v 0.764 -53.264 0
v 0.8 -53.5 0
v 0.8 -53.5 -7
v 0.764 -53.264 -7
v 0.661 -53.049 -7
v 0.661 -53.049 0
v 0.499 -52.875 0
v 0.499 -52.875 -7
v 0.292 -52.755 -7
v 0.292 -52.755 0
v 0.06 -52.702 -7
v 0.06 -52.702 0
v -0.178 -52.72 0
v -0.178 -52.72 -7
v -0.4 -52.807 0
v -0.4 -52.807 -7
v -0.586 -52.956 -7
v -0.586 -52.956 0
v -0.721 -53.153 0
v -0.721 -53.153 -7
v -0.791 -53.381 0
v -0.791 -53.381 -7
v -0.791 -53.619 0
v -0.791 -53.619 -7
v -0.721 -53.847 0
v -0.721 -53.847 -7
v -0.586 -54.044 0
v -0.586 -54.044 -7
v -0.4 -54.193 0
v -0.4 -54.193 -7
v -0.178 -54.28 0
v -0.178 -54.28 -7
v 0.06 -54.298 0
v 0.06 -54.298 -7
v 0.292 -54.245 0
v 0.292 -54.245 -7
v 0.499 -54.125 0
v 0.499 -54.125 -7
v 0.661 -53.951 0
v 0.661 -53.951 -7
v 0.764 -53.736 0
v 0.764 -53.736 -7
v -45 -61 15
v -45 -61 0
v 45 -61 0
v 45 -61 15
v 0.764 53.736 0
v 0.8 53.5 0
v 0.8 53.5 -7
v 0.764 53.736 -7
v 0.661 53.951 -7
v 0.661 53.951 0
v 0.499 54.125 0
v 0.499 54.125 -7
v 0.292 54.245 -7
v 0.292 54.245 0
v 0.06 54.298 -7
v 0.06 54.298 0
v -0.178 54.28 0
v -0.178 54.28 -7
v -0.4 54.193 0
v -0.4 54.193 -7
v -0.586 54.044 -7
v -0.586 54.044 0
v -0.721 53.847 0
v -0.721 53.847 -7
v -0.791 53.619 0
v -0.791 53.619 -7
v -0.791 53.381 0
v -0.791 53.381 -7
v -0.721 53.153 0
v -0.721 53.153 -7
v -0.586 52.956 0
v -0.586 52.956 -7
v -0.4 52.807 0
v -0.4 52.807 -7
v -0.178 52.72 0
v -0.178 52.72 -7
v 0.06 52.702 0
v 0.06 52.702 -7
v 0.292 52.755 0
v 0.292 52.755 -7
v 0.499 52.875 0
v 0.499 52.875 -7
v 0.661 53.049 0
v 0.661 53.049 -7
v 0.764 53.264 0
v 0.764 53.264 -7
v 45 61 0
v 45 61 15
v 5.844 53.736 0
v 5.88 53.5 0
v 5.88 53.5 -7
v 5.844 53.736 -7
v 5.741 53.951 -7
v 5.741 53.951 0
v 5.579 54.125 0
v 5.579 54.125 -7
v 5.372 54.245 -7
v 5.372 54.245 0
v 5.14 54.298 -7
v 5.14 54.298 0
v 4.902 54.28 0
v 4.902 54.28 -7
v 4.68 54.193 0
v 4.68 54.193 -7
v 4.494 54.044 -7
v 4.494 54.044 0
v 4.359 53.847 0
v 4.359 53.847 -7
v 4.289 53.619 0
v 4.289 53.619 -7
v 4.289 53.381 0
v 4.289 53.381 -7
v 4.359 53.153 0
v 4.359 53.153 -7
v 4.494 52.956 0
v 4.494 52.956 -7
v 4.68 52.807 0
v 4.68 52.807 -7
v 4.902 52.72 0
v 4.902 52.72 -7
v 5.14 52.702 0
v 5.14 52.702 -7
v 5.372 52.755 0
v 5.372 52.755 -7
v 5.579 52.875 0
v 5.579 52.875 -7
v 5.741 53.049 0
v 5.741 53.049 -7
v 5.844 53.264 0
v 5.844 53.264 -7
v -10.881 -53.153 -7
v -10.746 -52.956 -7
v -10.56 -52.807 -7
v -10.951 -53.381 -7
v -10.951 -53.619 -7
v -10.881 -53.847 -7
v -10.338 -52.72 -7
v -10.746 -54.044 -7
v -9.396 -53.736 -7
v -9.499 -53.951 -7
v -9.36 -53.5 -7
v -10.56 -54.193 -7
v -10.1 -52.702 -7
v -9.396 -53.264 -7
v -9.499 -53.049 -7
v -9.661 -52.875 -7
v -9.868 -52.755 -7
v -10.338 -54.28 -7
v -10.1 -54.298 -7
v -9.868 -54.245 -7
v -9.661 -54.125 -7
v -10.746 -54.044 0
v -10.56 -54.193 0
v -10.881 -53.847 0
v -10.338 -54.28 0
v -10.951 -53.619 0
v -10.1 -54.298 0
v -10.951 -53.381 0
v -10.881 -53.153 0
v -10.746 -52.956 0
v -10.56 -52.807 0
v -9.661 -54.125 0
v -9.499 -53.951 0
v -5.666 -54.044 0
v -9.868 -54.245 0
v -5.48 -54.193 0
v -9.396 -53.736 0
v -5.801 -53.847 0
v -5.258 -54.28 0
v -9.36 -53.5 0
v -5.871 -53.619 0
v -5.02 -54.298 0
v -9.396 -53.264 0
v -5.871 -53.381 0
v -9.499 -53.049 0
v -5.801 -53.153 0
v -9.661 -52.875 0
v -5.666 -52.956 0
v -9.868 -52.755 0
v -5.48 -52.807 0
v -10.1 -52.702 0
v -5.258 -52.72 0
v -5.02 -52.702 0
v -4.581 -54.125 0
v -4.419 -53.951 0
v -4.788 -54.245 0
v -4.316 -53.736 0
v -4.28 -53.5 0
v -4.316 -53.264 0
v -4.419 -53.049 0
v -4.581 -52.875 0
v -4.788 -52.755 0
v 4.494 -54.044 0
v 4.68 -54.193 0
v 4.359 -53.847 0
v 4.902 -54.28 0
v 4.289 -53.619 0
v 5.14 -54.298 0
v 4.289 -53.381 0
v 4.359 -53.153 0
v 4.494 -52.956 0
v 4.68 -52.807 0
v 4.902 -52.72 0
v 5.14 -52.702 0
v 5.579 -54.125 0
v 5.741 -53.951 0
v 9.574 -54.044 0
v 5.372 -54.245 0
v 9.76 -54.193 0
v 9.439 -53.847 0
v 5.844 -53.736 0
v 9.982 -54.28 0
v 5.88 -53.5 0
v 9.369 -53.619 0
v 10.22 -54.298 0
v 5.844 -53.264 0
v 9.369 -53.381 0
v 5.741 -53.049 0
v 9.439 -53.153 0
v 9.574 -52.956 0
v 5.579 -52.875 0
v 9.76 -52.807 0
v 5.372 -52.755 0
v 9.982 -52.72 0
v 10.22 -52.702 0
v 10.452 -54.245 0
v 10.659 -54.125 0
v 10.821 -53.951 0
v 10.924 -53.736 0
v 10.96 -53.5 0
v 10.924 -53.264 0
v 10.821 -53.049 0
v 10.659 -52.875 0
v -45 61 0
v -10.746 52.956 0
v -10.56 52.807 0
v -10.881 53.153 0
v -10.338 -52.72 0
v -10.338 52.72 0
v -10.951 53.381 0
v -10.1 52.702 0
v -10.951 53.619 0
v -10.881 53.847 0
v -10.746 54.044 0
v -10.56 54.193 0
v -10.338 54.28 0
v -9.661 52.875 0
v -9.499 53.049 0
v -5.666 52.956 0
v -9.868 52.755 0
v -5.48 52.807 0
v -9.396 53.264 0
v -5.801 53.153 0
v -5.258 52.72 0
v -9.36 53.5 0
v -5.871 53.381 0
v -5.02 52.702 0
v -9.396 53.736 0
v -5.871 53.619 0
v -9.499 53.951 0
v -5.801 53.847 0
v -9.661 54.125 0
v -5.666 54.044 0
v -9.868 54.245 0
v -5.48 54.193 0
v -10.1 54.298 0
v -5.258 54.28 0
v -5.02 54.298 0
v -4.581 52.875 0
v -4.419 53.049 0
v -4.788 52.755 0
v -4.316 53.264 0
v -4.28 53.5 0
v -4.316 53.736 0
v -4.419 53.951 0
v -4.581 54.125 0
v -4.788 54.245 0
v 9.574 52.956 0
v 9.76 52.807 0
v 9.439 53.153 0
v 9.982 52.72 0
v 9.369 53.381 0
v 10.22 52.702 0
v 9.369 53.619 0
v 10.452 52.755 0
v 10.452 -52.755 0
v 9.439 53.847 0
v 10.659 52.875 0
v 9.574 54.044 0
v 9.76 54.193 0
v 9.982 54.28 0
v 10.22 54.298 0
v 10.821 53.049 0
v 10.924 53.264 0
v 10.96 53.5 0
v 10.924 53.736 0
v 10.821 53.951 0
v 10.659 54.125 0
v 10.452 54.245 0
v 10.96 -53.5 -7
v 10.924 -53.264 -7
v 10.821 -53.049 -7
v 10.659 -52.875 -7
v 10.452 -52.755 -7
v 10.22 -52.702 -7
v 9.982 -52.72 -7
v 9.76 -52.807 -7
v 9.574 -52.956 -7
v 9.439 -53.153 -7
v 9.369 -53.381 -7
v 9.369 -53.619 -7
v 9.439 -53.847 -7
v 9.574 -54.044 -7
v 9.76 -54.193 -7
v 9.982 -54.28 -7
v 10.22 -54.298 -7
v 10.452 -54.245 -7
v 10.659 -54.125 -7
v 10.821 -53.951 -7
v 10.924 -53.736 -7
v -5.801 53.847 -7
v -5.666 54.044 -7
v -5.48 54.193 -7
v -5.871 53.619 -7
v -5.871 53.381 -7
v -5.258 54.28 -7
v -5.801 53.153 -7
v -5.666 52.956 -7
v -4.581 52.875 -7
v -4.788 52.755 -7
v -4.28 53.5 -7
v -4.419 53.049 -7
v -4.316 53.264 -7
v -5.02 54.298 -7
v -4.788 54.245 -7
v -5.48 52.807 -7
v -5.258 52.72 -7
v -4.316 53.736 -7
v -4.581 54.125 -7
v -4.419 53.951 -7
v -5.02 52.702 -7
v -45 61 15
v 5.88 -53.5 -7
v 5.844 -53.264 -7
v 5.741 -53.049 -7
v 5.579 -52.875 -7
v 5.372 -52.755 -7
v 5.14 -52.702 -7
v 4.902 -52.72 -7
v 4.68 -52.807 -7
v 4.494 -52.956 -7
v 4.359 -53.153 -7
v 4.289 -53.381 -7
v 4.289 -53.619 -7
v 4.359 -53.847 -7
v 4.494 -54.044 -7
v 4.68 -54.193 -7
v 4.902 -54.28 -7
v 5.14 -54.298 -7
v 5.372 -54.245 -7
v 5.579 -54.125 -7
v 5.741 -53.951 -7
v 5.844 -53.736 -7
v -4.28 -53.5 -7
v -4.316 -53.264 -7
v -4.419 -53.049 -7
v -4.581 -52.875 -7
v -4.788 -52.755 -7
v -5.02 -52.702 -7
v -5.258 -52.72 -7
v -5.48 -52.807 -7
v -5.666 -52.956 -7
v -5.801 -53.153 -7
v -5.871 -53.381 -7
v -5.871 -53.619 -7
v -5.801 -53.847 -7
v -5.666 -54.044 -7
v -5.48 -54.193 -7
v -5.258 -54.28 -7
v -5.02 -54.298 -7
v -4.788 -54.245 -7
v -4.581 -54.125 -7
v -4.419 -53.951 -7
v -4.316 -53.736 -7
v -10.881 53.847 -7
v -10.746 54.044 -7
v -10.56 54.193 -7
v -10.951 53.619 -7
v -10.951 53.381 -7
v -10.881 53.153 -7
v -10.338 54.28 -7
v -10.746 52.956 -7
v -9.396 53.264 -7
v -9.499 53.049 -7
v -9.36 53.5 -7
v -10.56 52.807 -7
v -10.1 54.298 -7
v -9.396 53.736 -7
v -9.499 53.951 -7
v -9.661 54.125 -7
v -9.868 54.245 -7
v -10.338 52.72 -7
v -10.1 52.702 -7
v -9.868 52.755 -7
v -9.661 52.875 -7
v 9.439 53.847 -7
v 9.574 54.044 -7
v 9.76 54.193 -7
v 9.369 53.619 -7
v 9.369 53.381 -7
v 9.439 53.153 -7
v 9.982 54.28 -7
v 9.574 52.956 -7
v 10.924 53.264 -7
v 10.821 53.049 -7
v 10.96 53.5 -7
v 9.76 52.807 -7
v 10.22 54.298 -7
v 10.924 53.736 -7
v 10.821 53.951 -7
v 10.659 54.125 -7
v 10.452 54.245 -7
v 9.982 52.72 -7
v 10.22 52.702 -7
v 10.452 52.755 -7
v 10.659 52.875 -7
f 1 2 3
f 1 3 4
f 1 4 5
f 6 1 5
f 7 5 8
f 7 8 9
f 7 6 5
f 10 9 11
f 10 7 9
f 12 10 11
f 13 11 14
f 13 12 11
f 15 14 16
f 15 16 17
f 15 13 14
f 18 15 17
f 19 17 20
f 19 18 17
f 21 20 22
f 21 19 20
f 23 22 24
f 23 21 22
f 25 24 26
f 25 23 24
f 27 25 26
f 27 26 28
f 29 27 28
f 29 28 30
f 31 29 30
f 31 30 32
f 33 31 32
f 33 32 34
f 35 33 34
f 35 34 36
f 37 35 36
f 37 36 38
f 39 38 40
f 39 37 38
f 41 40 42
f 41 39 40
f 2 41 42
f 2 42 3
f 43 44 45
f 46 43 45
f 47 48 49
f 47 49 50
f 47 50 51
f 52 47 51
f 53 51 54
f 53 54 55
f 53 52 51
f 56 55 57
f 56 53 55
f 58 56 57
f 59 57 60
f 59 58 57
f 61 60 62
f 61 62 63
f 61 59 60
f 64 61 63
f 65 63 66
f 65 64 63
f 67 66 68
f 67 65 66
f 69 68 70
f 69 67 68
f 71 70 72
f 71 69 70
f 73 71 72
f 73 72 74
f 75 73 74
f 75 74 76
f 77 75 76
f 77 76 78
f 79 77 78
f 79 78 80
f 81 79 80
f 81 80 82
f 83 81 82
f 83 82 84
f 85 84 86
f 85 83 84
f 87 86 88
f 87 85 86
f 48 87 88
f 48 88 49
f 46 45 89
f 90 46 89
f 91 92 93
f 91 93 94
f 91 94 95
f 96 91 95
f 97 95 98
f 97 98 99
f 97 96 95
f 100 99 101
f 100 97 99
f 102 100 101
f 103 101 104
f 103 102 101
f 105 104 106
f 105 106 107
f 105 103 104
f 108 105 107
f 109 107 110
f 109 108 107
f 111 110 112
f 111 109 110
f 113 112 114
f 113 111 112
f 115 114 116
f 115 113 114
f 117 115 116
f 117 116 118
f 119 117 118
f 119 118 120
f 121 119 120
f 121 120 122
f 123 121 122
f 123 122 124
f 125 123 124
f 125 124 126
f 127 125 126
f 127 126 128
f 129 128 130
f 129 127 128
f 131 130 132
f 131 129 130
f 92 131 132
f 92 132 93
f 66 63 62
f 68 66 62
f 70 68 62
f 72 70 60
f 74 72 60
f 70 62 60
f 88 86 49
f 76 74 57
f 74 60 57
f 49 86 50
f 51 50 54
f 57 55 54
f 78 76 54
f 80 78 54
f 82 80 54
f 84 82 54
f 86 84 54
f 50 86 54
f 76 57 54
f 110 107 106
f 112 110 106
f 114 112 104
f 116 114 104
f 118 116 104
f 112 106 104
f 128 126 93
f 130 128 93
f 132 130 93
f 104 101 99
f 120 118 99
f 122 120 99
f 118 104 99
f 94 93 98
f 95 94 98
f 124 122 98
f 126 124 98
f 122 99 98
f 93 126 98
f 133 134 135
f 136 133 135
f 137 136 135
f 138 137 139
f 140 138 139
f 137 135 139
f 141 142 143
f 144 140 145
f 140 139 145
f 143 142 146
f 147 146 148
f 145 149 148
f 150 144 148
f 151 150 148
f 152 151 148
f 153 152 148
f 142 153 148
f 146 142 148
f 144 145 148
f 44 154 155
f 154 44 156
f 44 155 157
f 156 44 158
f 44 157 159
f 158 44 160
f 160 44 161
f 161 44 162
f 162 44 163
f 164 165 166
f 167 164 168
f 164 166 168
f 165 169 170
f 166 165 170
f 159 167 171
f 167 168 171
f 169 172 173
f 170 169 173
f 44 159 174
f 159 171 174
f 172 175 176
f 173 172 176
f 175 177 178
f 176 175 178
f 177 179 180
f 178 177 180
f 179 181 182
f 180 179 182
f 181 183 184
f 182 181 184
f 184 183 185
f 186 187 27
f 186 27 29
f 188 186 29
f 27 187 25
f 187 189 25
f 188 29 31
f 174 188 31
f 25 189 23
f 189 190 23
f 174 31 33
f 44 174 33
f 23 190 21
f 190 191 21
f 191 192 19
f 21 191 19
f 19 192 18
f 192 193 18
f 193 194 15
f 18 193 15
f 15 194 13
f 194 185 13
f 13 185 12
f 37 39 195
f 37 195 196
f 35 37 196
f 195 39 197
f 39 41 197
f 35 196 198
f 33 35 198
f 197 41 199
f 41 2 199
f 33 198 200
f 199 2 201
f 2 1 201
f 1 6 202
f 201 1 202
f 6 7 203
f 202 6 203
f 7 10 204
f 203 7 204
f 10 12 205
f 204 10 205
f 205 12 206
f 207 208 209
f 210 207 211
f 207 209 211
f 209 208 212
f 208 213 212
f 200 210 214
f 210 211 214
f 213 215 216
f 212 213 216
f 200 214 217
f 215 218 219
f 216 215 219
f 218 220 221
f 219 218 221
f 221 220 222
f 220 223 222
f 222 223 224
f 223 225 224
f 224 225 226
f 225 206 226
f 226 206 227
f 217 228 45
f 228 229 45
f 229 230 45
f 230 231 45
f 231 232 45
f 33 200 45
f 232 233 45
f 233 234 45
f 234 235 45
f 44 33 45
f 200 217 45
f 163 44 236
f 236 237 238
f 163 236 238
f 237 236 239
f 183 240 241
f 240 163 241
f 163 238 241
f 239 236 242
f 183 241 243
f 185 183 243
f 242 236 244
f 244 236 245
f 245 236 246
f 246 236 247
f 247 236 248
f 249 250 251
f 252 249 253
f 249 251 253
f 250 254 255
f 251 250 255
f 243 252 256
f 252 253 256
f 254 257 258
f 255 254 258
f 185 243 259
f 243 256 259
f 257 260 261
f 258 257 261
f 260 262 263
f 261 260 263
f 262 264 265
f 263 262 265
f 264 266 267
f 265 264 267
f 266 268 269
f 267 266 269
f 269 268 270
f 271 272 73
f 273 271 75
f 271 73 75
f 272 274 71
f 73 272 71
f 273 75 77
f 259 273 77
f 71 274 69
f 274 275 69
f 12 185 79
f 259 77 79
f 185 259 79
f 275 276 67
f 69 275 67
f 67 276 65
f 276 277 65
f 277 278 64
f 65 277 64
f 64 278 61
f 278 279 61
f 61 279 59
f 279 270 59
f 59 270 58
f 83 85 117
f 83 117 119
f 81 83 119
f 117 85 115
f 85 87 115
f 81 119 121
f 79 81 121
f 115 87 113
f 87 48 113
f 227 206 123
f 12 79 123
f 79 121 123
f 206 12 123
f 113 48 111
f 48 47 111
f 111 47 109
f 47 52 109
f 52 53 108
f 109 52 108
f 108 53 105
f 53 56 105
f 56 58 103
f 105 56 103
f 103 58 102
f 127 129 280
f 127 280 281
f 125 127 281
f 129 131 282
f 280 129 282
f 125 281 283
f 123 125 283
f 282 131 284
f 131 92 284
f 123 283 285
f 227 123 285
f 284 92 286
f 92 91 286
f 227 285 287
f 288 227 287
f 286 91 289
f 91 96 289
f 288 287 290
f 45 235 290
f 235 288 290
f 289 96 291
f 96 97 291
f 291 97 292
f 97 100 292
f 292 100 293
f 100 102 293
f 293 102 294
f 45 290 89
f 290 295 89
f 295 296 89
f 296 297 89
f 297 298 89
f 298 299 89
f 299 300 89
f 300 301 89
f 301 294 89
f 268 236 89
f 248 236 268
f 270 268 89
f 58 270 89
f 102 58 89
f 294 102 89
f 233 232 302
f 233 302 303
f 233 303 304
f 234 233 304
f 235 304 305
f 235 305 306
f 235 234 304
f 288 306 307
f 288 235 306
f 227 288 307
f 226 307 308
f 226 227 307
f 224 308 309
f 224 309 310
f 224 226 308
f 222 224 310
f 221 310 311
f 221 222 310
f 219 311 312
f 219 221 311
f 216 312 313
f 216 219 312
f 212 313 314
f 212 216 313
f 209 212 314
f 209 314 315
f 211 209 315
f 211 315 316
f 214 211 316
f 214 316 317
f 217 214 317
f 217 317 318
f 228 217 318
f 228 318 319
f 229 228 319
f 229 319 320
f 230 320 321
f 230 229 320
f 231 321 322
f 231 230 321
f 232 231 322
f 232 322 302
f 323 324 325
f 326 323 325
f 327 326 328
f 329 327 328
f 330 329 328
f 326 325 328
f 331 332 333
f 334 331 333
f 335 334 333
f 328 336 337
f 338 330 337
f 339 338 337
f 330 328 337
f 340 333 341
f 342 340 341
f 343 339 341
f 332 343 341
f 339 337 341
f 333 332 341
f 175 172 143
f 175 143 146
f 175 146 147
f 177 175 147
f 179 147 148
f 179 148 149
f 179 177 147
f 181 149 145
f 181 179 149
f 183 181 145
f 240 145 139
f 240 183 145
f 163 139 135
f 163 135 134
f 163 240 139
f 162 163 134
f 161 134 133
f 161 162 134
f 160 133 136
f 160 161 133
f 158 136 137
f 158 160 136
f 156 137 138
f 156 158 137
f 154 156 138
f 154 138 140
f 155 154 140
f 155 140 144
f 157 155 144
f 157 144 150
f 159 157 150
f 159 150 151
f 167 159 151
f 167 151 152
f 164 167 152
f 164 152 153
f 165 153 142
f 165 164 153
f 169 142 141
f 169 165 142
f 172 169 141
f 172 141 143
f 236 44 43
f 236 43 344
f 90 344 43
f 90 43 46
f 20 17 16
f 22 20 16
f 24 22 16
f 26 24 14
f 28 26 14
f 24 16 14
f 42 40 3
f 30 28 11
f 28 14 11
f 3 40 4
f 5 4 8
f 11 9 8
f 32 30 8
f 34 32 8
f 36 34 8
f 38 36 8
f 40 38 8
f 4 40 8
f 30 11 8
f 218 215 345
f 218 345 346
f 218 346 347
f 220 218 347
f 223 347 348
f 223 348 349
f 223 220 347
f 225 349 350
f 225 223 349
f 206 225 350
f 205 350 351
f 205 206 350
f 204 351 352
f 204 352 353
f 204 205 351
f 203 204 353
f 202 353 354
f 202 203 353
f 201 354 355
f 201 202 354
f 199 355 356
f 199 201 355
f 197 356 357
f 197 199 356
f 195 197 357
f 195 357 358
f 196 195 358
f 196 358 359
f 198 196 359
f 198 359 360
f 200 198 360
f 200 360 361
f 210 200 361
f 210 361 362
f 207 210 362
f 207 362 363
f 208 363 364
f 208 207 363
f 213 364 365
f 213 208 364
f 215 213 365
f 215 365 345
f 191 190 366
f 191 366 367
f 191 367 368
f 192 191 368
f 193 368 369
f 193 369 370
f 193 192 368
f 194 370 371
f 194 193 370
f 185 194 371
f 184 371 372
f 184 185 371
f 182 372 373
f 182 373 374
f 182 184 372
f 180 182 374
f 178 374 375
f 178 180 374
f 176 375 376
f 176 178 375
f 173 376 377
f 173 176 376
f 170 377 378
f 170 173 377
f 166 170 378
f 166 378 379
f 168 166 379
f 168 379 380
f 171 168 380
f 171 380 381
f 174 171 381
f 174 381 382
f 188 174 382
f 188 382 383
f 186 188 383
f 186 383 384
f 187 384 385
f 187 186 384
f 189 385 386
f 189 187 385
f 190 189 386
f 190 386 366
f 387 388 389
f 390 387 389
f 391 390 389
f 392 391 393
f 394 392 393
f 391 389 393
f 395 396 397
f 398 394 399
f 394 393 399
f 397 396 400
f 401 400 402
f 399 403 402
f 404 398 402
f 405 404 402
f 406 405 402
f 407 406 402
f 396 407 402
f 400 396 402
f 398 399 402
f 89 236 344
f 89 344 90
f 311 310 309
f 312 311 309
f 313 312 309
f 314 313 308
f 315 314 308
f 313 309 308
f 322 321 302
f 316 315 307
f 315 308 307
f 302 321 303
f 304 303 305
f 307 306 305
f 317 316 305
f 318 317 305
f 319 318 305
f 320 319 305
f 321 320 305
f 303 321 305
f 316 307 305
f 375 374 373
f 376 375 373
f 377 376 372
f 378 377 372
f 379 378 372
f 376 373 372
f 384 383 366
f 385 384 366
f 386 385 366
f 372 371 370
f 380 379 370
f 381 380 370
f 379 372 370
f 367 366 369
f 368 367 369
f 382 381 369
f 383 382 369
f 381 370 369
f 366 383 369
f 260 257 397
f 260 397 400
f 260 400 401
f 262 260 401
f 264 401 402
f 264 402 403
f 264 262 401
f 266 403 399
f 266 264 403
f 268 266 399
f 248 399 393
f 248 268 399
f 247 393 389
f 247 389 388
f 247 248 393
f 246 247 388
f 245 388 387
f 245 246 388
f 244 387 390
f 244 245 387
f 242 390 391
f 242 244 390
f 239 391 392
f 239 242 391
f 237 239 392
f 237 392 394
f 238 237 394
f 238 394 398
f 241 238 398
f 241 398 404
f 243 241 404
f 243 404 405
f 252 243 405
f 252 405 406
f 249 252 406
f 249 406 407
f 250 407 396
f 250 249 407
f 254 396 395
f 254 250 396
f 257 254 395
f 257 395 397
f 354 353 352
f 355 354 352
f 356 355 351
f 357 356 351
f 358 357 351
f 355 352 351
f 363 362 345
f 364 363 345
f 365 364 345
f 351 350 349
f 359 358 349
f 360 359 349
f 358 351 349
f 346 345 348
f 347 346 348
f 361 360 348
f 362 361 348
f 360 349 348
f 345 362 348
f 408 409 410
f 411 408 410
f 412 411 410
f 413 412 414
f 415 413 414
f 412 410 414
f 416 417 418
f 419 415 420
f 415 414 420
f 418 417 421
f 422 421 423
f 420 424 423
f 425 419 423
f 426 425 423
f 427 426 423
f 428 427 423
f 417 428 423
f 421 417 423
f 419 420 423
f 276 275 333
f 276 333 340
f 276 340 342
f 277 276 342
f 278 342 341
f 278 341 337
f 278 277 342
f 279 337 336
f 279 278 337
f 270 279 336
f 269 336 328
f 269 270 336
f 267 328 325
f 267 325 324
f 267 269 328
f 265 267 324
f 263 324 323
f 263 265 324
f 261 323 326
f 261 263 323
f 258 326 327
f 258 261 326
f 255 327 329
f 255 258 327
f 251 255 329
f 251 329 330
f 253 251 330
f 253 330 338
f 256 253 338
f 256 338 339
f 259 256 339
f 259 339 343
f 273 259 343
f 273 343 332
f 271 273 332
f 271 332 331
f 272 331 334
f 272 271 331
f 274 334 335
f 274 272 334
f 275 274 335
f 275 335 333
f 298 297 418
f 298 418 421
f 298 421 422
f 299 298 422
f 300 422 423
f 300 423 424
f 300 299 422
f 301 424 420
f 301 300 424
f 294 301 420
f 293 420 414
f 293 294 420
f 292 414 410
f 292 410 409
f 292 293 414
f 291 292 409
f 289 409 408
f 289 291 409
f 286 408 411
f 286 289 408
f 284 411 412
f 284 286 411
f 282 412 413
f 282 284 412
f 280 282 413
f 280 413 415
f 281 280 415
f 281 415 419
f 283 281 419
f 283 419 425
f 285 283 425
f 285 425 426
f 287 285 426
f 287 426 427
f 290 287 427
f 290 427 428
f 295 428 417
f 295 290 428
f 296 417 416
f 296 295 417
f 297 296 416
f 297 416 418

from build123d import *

# Parameters (mm, degrees)
CROQUIS1_W              = 90
CROQUIS1_H              = 122
SALIENTE_EXTRUIR1_DEPTH = 15
CROQUIS2_R              = 0.8
SALIENTE_EXTRUIR2_DEPTH = 7


with BuildPart() as part:
    # Croquis1 → Saliente-Extruir1 (new body)
    with BuildSketch(Plane.XY):
        Rectangle(CROQUIS1_W, CROQUIS1_H)
    extrude(amount=SALIENTE_EXTRUIR1_DEPTH)

    # Croquis2 → Saliente-Extruir2 (add)
    with BuildSketch(Plane.XY):
        with Locations((10.16, -53.5)):
            Circle(CROQUIS2_R)
        with Locations((10.16, 53.5)):
            Circle(CROQUIS2_R)
        with Locations((5.08, -53.5)):
            Circle(CROQUIS2_R)
        with Locations((5.08, 53.5)):
            Circle(CROQUIS2_R)
        with Locations((0, -53.5)):
            Circle(CROQUIS2_R)
        with Locations((0, 53.5)):
            Circle(CROQUIS2_R)
        with Locations((-5.08, -53.5)):
            Circle(CROQUIS2_R)
        with Locations((-5.08, 53.5)):
            Circle(CROQUIS2_R)
        with Locations((-10.16, -53.5)):
            Circle(CROQUIS2_R)
        with Locations((-10.16, 53.5)):
            Circle(CROQUIS2_R)
    extrude(amount=-SALIENTE_EXTRUIR2_DEPTH)


solid = part.part
